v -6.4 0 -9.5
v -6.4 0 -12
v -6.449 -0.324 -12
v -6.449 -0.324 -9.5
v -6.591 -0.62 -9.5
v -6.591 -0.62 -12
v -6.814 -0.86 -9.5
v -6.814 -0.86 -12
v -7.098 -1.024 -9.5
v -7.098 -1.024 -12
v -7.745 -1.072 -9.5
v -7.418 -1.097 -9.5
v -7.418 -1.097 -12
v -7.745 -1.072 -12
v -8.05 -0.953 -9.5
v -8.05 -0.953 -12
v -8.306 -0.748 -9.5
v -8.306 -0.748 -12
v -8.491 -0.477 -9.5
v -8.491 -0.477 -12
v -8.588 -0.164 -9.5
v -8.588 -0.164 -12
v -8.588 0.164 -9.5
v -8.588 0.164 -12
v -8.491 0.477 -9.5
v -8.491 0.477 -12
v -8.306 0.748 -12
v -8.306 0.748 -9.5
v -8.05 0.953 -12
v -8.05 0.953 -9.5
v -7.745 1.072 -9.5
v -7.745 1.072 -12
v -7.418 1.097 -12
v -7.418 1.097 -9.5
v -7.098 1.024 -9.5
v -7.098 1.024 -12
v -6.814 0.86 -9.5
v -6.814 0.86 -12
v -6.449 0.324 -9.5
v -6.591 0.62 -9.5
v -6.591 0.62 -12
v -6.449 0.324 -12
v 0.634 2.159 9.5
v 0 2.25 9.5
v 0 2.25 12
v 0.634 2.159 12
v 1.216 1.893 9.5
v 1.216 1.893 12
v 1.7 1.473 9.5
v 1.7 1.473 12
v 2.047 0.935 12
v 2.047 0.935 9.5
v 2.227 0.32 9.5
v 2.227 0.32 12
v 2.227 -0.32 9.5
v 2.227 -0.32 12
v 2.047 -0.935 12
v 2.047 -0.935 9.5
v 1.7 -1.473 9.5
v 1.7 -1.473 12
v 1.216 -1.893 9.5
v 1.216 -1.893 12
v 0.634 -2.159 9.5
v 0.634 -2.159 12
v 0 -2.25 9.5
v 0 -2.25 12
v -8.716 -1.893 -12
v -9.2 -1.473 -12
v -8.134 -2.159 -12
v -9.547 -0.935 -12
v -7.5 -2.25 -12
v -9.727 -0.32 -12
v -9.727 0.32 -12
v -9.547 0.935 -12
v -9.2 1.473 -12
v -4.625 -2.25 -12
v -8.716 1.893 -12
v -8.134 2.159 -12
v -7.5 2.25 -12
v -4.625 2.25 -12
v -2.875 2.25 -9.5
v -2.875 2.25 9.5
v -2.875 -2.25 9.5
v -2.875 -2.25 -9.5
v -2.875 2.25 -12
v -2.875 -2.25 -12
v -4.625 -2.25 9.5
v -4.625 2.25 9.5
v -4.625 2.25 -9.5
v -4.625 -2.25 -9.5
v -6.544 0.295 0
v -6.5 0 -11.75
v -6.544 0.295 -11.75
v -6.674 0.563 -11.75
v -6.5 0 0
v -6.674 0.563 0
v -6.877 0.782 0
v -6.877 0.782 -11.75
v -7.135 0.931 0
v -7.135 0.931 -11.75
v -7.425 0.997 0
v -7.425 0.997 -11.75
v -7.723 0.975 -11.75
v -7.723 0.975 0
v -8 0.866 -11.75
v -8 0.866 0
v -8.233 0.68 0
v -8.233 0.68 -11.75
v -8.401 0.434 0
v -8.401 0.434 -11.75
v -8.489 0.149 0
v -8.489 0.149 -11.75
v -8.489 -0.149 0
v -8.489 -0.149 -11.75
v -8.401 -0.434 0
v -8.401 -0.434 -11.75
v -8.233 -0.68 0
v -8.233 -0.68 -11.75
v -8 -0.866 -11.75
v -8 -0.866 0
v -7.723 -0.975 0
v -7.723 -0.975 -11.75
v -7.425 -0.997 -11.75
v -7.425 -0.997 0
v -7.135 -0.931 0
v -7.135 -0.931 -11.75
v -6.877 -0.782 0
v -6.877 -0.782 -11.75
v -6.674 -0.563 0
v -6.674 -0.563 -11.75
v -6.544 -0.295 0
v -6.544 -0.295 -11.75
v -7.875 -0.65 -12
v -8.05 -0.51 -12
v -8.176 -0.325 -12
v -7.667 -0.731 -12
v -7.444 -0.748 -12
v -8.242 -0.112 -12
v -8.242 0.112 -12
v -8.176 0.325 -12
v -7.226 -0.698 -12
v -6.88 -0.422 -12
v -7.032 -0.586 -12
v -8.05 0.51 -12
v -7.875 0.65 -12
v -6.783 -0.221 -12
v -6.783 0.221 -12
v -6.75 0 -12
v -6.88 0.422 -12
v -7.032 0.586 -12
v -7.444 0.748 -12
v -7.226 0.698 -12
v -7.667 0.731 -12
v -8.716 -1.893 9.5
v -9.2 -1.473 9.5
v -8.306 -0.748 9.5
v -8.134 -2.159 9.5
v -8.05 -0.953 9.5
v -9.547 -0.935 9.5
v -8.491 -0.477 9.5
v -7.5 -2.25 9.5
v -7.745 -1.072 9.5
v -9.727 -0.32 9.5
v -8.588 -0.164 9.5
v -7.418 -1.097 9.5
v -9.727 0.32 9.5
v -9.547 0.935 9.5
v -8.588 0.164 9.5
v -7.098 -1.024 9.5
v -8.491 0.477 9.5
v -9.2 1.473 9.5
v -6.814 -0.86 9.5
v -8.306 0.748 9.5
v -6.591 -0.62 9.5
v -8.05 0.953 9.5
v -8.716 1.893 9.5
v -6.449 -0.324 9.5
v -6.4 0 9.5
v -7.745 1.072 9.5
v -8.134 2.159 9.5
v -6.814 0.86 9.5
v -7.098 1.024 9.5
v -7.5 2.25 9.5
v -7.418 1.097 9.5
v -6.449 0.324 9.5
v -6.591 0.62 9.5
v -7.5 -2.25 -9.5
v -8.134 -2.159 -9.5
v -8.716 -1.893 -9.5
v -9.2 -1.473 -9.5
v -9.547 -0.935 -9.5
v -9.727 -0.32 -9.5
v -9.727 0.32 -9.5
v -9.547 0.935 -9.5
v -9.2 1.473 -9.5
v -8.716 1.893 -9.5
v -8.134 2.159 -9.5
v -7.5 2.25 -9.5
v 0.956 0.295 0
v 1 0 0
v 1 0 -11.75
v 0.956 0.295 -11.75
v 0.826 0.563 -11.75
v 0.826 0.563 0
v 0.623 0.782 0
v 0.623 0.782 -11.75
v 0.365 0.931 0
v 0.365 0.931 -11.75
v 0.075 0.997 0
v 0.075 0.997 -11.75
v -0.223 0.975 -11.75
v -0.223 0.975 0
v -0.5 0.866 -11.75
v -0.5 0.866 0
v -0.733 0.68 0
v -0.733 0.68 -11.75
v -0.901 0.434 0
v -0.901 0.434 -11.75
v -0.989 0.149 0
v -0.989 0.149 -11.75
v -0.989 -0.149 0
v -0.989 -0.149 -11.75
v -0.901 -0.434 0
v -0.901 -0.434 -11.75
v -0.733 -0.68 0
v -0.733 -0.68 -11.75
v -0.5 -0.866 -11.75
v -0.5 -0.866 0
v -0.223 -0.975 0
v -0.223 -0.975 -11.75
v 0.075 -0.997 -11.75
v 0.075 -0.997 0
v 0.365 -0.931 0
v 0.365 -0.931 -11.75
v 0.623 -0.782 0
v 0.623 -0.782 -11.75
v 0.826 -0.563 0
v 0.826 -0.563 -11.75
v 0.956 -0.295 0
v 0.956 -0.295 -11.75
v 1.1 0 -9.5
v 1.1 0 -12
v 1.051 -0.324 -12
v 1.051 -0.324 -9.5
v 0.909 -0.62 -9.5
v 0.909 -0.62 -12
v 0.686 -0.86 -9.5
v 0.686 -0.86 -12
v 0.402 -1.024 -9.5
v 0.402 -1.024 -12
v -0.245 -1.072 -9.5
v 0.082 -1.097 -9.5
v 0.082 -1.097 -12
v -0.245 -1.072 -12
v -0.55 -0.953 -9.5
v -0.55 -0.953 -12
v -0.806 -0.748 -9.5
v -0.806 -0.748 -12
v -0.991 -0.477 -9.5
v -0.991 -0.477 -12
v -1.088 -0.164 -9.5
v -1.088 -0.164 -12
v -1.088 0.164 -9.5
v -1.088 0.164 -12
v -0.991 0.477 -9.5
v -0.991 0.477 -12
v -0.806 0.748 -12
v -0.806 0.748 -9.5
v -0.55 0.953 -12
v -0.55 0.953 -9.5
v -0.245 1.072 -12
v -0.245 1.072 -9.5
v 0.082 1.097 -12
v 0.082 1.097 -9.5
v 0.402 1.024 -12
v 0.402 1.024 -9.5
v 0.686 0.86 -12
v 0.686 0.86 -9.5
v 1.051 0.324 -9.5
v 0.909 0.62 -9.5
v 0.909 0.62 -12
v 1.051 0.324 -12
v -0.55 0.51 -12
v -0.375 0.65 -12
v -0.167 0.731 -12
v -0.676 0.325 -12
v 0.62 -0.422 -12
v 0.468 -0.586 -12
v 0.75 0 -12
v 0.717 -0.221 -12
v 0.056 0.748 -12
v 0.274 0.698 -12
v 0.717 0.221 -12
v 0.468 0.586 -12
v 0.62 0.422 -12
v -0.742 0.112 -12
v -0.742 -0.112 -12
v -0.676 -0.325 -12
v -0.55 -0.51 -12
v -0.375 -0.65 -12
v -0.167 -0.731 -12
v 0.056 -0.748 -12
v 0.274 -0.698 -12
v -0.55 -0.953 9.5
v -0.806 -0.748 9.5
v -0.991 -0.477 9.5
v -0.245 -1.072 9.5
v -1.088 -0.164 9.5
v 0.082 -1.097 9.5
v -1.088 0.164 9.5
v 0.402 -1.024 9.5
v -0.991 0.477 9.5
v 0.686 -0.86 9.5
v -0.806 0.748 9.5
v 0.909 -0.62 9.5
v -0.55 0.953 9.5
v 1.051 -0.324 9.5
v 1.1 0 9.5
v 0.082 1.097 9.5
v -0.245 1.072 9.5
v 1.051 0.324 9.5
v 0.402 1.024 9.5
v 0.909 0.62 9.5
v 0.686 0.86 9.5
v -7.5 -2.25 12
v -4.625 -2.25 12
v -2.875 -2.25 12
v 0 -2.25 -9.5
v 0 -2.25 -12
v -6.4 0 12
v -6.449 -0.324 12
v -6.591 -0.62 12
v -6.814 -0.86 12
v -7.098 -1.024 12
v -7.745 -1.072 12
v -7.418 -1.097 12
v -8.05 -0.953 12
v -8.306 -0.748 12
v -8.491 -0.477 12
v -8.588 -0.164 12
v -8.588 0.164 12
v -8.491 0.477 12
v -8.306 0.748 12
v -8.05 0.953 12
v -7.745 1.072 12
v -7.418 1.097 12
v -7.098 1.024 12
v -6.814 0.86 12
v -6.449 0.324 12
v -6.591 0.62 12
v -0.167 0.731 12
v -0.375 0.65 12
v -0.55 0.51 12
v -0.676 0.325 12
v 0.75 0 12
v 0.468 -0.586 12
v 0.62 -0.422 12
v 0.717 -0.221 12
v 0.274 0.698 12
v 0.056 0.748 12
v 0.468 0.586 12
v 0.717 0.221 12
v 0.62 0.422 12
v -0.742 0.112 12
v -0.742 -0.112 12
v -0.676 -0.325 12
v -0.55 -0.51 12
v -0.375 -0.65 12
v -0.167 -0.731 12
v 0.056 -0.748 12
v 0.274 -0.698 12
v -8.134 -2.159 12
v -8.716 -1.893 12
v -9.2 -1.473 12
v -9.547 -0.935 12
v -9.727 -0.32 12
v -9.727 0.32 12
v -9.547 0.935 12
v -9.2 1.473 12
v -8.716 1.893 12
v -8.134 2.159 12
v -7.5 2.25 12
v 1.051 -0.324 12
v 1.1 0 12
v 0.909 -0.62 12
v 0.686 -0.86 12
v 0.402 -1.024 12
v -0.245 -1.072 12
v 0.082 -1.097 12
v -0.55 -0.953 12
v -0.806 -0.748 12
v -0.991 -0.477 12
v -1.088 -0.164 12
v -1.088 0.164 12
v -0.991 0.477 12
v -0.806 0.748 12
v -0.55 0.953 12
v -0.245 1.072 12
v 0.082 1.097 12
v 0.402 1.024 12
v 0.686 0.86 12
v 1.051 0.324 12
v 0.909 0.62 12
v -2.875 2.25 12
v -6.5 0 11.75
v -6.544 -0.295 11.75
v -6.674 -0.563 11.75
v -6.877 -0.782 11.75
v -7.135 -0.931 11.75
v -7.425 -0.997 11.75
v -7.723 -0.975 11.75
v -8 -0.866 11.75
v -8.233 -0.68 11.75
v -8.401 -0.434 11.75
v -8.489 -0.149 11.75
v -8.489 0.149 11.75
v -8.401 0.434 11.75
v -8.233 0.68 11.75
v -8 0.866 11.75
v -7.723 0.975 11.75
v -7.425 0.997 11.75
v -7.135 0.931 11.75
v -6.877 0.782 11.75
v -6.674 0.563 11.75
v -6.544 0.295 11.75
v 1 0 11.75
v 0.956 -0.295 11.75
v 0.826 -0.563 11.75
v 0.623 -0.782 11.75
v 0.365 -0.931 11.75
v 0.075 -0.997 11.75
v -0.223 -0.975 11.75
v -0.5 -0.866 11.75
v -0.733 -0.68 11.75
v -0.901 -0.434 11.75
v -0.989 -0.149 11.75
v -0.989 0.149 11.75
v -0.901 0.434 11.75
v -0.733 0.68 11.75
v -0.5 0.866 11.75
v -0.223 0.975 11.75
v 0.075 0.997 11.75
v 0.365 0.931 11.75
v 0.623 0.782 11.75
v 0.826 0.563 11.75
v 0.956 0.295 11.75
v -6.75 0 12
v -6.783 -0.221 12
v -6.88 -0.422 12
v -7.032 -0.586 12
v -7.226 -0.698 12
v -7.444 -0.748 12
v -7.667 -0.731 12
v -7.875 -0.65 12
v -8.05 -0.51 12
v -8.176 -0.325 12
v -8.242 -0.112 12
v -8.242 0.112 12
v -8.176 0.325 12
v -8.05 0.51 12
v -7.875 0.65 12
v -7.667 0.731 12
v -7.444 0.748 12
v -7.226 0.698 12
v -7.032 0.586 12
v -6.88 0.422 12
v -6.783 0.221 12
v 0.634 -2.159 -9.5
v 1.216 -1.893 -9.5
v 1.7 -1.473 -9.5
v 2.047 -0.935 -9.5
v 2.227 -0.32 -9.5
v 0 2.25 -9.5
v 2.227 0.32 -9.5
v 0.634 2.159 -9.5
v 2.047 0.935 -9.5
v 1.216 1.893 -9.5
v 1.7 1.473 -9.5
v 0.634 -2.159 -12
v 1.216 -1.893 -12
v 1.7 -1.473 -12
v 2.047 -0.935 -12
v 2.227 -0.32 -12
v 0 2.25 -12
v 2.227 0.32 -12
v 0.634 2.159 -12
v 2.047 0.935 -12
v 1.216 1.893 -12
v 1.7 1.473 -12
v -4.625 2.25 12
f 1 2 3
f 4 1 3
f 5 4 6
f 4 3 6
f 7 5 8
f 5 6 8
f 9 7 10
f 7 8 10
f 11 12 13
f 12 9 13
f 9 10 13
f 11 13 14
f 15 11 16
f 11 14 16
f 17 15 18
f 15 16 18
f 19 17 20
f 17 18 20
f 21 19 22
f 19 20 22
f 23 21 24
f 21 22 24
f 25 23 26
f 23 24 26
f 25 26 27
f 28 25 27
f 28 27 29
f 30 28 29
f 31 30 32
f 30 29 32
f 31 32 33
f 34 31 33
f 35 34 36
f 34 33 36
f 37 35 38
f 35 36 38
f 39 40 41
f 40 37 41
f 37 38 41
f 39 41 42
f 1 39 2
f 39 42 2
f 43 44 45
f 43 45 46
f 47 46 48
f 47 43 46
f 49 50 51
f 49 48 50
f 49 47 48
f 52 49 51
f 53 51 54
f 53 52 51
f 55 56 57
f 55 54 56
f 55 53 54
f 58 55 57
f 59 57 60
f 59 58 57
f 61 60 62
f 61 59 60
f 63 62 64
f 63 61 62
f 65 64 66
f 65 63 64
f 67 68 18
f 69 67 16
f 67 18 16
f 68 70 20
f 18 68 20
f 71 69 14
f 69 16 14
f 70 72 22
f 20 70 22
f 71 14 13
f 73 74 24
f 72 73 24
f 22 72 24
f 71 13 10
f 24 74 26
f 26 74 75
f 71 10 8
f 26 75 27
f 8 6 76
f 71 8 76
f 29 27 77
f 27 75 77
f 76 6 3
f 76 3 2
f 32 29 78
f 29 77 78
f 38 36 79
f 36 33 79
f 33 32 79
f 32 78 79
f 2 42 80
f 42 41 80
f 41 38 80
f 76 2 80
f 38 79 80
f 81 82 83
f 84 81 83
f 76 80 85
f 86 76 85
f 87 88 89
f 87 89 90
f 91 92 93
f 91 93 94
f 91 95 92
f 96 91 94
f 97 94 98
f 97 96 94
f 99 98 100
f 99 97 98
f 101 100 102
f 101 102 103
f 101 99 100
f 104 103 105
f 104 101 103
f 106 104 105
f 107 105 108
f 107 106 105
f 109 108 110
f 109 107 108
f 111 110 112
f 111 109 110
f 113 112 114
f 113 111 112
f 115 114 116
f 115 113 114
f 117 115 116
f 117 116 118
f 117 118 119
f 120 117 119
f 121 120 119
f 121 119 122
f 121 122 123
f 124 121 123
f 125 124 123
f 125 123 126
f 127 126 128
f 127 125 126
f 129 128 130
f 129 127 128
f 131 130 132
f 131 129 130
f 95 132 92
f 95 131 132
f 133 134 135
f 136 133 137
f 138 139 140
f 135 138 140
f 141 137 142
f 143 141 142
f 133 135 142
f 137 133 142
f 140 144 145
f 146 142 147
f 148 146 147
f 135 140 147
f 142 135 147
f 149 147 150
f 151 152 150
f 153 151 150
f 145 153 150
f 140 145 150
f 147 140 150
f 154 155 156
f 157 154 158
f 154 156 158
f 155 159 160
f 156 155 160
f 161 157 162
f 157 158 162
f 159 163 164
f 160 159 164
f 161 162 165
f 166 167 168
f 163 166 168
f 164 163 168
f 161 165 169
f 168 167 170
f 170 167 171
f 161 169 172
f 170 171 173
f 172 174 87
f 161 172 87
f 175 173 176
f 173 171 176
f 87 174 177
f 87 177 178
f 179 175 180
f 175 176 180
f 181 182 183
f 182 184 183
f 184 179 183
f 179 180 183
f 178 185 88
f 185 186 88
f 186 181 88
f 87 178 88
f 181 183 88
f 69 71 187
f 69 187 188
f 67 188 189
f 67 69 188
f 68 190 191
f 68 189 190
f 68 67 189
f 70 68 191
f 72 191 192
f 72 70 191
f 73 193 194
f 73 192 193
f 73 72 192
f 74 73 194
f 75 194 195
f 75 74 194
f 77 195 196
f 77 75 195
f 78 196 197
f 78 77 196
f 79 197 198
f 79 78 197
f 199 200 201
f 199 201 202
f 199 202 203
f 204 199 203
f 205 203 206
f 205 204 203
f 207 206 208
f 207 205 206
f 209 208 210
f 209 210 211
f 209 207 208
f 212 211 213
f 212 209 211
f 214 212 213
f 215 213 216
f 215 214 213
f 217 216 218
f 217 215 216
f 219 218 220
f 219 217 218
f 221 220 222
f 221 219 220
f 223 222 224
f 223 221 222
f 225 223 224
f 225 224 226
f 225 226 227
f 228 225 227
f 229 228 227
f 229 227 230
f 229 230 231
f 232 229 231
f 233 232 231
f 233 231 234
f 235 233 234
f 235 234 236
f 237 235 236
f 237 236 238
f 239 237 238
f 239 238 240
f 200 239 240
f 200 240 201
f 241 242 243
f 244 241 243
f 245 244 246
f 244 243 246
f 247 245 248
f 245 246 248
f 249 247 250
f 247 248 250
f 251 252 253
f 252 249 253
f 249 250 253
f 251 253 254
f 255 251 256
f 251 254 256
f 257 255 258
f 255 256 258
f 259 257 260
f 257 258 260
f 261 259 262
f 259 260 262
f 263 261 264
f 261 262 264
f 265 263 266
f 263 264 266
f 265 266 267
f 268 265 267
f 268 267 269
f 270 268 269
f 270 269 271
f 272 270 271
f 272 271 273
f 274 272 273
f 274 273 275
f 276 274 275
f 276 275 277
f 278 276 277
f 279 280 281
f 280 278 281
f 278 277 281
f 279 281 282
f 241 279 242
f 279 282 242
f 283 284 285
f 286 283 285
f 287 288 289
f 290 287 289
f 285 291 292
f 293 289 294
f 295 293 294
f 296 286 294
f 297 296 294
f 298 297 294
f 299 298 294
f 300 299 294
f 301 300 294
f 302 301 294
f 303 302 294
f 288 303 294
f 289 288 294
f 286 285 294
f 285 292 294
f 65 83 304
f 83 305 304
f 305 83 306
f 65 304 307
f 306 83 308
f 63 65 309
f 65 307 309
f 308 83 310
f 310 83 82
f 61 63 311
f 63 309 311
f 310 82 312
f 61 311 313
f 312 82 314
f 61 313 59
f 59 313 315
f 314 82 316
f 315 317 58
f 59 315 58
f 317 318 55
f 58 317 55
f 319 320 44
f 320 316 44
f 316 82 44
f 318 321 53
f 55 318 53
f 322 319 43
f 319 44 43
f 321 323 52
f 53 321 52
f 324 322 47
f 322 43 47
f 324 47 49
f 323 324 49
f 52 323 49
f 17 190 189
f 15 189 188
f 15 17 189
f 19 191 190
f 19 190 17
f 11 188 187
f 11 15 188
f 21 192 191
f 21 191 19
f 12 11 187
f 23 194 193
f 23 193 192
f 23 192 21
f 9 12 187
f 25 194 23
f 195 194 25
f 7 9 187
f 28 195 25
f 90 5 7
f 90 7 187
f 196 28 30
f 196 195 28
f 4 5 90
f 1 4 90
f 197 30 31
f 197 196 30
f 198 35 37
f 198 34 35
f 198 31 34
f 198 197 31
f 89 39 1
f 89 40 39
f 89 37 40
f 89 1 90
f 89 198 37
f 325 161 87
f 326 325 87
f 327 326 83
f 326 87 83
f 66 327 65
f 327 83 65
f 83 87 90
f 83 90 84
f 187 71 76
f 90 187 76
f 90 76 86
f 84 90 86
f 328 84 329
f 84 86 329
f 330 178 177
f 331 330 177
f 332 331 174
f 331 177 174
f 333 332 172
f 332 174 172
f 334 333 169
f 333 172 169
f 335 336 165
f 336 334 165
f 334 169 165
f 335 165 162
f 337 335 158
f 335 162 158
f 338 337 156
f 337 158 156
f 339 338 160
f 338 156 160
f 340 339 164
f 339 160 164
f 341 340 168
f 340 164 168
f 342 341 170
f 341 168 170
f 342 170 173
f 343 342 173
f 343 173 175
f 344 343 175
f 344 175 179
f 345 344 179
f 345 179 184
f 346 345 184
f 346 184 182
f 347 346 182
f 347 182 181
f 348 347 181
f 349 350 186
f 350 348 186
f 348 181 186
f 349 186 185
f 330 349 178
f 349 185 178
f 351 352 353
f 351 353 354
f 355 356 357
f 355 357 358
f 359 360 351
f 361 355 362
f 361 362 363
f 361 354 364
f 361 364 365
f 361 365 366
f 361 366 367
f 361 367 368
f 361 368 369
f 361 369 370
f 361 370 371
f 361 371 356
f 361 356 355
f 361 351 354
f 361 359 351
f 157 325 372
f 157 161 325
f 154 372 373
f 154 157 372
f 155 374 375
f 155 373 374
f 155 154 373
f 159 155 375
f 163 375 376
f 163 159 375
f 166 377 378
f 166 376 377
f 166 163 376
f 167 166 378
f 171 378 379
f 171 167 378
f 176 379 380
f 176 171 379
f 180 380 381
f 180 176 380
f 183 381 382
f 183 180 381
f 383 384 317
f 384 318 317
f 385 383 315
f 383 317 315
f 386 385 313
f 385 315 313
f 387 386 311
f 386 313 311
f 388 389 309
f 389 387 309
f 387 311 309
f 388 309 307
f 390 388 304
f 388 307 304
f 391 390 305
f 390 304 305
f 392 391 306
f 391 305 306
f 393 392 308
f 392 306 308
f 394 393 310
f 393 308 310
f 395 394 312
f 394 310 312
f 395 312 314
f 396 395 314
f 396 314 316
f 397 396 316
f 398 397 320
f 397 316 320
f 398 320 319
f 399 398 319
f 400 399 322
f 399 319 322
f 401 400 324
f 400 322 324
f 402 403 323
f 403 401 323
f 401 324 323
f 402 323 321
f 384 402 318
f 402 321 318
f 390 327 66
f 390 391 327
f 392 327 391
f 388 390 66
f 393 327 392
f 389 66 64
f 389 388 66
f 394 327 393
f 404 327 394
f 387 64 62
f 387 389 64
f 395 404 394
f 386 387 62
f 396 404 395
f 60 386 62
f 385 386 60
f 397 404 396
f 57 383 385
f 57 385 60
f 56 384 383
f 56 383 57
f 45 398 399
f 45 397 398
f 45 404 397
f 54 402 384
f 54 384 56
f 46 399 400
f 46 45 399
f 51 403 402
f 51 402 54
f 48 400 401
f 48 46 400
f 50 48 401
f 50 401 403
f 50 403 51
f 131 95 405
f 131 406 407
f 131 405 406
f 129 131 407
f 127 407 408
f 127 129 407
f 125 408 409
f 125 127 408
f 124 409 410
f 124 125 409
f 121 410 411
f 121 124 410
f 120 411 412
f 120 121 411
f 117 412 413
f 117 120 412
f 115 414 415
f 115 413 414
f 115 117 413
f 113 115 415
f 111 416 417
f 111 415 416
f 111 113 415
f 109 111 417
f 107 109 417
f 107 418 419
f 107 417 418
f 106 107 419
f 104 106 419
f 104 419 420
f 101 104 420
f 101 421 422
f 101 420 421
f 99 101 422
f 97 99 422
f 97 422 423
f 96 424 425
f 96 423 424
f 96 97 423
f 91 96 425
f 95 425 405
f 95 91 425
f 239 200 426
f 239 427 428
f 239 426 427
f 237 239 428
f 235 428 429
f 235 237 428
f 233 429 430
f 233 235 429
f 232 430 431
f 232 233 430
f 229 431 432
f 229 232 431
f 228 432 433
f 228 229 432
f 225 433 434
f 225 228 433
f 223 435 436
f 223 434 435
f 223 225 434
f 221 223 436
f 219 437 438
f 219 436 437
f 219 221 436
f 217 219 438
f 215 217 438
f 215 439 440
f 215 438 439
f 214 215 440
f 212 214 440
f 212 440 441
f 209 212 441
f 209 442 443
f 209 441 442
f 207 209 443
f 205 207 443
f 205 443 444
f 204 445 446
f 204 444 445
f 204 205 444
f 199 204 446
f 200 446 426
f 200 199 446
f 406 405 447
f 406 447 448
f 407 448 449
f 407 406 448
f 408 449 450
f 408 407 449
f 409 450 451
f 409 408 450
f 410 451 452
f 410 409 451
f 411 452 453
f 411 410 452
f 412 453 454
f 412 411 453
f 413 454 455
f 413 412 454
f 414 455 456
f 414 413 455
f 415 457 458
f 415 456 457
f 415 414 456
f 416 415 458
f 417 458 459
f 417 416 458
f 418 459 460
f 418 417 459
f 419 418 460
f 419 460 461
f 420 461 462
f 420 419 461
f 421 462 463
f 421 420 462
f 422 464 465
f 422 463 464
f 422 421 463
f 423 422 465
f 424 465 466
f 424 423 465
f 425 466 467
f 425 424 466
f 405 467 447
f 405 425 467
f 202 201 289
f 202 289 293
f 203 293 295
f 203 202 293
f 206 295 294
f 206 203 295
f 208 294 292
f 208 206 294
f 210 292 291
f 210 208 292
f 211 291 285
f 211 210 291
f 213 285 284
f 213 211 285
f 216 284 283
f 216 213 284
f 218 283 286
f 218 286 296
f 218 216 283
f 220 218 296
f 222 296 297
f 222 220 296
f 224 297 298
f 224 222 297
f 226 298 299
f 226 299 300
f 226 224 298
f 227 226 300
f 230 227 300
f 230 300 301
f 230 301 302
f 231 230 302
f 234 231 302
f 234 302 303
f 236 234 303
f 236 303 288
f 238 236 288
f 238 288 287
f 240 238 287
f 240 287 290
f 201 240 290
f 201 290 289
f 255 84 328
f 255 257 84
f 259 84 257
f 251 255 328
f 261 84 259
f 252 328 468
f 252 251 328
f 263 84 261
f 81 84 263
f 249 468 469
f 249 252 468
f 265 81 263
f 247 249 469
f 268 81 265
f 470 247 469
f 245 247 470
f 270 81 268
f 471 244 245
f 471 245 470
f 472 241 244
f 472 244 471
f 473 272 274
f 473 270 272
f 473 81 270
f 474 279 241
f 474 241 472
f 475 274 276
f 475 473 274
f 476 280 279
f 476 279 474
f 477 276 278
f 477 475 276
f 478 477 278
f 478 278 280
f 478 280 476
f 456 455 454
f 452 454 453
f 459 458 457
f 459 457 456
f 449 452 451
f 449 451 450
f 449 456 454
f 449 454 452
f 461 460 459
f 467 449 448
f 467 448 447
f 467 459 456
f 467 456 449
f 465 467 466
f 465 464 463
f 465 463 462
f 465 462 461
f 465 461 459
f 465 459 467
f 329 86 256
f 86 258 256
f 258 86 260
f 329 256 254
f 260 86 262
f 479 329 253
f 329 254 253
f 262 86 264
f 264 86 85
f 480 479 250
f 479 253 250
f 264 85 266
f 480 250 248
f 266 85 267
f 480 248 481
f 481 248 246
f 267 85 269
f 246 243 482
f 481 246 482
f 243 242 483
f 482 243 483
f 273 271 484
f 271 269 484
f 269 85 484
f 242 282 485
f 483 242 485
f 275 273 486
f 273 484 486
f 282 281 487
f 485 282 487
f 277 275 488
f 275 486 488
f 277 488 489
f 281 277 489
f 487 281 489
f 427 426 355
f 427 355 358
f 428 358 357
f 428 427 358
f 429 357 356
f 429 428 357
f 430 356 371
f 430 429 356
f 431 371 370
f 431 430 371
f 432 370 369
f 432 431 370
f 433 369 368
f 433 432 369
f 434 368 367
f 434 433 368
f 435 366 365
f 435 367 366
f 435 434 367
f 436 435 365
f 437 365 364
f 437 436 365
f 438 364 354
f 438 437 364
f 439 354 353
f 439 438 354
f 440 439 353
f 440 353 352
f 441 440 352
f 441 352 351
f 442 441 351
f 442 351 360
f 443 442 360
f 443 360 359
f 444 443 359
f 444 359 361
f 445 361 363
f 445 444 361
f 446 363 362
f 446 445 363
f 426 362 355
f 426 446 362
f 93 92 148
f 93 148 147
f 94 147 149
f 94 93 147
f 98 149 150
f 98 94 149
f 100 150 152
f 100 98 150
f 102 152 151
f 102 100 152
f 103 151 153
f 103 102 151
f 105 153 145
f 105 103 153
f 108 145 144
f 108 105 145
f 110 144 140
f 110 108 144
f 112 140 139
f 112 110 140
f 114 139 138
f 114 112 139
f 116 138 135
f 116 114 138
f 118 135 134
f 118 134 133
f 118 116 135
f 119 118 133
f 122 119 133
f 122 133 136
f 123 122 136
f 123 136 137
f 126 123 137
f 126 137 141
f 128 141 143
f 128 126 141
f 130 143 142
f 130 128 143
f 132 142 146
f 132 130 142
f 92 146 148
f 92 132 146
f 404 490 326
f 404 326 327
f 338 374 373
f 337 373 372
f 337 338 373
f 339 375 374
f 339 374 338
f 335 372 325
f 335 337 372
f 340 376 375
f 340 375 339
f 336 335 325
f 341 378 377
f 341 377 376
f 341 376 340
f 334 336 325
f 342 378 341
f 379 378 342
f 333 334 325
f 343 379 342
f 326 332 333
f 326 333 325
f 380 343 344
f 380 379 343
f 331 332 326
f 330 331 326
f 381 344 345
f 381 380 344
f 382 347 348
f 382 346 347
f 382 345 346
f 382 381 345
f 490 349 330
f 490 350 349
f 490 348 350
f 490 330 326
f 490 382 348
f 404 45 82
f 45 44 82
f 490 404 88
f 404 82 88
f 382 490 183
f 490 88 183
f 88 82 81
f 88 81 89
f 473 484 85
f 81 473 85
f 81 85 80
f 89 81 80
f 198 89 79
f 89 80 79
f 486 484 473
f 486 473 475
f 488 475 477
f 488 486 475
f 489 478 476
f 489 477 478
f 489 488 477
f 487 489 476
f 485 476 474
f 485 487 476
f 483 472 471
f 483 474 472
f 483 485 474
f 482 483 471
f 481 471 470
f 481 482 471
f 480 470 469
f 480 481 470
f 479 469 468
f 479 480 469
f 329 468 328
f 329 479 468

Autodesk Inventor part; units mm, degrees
ref_plane "YZ Plane" through (0, 0, 0) normal (1, 0, 0) x (0, 1, 0)
ref_plane "XZ Plane" through (0, 0, 0) normal (0, 1, 0) x (-1, 0, 0)
ref_plane "XY Plane" through (0, 0, 0) normal (0, 0, 1) x (1, 0, 0)
sketch "Skizze1" plane through (0, 0, 0) normal (0, 0, 1) x (1, 0, 0)
  line L0 (-12.15, 0) -> (4.65, 0) construction
  line L1 (0, -3.15) -> (0, 3.15) construction
  circle A0 centre (0, 0) radius 1.1
  circle A1 centre (-7.5, 0) radius 1.1
  line L2 (-7.5, 0) -> (0, 0) construction
  line L3 (-7.5, -2.25) -> (0, -2.25)
  line L4 (0, 2.25) -> (-7.5, 2.25)
  arc A2 (-7.5, 2.25) -> (-7.5, -2.25) centre (-7.5, 0) ccw
  arc A3 (0, -2.25) -> (0, 2.25) centre (0, 0) ccw
  line L5 (-4.625, 2.25) -> (-4.625, -2.25)
  line L6 (-2.875, 2.25) -> (-2.875, -2.25)
  line L7 (-3.75, 2.25) -> (-3.75, -2.25) construction
  circle A4 centre (-7.5, 0) radius 1
  circle A5 centre (0, 0) radius 1
  point P0 (-3.75, 0)
  dimension "d34" = 2.2
  dimension "d35" = 7.5
  dimension "d43" = 1.75
  dimension "d46" = 2
  dimension "d50" = 4.5
extrude "Extrusion9" add sketch "Skizze1" along normal mid plane 24 contours A2 L4 L5 L3 | L5 L4 L6 L3 | L6 L4 A3 L3
extrude "Extrusion10" cut sketch "Skizze1" along normal mid plane 19 contours A2 L4 L5 L3 | L5 L4 L6 L3 | L6 L4 A3 L3
extrude "Extrusion11" add sketch "Skizze1" along normal through all both and the other way through all contours L5 L4 L6 L3
extrude "Extrusion12" add sketch "Skizze1" along normal mid plane 24 separate body contours A4 | A5
chamfer "Fase1" distance 0.25 angle 45 4 edges at (-1, 0, 12) (-8.5, 0, 12) (-1, 0, -12) (-8.5, 0, -12)
properties part number "Lever"
